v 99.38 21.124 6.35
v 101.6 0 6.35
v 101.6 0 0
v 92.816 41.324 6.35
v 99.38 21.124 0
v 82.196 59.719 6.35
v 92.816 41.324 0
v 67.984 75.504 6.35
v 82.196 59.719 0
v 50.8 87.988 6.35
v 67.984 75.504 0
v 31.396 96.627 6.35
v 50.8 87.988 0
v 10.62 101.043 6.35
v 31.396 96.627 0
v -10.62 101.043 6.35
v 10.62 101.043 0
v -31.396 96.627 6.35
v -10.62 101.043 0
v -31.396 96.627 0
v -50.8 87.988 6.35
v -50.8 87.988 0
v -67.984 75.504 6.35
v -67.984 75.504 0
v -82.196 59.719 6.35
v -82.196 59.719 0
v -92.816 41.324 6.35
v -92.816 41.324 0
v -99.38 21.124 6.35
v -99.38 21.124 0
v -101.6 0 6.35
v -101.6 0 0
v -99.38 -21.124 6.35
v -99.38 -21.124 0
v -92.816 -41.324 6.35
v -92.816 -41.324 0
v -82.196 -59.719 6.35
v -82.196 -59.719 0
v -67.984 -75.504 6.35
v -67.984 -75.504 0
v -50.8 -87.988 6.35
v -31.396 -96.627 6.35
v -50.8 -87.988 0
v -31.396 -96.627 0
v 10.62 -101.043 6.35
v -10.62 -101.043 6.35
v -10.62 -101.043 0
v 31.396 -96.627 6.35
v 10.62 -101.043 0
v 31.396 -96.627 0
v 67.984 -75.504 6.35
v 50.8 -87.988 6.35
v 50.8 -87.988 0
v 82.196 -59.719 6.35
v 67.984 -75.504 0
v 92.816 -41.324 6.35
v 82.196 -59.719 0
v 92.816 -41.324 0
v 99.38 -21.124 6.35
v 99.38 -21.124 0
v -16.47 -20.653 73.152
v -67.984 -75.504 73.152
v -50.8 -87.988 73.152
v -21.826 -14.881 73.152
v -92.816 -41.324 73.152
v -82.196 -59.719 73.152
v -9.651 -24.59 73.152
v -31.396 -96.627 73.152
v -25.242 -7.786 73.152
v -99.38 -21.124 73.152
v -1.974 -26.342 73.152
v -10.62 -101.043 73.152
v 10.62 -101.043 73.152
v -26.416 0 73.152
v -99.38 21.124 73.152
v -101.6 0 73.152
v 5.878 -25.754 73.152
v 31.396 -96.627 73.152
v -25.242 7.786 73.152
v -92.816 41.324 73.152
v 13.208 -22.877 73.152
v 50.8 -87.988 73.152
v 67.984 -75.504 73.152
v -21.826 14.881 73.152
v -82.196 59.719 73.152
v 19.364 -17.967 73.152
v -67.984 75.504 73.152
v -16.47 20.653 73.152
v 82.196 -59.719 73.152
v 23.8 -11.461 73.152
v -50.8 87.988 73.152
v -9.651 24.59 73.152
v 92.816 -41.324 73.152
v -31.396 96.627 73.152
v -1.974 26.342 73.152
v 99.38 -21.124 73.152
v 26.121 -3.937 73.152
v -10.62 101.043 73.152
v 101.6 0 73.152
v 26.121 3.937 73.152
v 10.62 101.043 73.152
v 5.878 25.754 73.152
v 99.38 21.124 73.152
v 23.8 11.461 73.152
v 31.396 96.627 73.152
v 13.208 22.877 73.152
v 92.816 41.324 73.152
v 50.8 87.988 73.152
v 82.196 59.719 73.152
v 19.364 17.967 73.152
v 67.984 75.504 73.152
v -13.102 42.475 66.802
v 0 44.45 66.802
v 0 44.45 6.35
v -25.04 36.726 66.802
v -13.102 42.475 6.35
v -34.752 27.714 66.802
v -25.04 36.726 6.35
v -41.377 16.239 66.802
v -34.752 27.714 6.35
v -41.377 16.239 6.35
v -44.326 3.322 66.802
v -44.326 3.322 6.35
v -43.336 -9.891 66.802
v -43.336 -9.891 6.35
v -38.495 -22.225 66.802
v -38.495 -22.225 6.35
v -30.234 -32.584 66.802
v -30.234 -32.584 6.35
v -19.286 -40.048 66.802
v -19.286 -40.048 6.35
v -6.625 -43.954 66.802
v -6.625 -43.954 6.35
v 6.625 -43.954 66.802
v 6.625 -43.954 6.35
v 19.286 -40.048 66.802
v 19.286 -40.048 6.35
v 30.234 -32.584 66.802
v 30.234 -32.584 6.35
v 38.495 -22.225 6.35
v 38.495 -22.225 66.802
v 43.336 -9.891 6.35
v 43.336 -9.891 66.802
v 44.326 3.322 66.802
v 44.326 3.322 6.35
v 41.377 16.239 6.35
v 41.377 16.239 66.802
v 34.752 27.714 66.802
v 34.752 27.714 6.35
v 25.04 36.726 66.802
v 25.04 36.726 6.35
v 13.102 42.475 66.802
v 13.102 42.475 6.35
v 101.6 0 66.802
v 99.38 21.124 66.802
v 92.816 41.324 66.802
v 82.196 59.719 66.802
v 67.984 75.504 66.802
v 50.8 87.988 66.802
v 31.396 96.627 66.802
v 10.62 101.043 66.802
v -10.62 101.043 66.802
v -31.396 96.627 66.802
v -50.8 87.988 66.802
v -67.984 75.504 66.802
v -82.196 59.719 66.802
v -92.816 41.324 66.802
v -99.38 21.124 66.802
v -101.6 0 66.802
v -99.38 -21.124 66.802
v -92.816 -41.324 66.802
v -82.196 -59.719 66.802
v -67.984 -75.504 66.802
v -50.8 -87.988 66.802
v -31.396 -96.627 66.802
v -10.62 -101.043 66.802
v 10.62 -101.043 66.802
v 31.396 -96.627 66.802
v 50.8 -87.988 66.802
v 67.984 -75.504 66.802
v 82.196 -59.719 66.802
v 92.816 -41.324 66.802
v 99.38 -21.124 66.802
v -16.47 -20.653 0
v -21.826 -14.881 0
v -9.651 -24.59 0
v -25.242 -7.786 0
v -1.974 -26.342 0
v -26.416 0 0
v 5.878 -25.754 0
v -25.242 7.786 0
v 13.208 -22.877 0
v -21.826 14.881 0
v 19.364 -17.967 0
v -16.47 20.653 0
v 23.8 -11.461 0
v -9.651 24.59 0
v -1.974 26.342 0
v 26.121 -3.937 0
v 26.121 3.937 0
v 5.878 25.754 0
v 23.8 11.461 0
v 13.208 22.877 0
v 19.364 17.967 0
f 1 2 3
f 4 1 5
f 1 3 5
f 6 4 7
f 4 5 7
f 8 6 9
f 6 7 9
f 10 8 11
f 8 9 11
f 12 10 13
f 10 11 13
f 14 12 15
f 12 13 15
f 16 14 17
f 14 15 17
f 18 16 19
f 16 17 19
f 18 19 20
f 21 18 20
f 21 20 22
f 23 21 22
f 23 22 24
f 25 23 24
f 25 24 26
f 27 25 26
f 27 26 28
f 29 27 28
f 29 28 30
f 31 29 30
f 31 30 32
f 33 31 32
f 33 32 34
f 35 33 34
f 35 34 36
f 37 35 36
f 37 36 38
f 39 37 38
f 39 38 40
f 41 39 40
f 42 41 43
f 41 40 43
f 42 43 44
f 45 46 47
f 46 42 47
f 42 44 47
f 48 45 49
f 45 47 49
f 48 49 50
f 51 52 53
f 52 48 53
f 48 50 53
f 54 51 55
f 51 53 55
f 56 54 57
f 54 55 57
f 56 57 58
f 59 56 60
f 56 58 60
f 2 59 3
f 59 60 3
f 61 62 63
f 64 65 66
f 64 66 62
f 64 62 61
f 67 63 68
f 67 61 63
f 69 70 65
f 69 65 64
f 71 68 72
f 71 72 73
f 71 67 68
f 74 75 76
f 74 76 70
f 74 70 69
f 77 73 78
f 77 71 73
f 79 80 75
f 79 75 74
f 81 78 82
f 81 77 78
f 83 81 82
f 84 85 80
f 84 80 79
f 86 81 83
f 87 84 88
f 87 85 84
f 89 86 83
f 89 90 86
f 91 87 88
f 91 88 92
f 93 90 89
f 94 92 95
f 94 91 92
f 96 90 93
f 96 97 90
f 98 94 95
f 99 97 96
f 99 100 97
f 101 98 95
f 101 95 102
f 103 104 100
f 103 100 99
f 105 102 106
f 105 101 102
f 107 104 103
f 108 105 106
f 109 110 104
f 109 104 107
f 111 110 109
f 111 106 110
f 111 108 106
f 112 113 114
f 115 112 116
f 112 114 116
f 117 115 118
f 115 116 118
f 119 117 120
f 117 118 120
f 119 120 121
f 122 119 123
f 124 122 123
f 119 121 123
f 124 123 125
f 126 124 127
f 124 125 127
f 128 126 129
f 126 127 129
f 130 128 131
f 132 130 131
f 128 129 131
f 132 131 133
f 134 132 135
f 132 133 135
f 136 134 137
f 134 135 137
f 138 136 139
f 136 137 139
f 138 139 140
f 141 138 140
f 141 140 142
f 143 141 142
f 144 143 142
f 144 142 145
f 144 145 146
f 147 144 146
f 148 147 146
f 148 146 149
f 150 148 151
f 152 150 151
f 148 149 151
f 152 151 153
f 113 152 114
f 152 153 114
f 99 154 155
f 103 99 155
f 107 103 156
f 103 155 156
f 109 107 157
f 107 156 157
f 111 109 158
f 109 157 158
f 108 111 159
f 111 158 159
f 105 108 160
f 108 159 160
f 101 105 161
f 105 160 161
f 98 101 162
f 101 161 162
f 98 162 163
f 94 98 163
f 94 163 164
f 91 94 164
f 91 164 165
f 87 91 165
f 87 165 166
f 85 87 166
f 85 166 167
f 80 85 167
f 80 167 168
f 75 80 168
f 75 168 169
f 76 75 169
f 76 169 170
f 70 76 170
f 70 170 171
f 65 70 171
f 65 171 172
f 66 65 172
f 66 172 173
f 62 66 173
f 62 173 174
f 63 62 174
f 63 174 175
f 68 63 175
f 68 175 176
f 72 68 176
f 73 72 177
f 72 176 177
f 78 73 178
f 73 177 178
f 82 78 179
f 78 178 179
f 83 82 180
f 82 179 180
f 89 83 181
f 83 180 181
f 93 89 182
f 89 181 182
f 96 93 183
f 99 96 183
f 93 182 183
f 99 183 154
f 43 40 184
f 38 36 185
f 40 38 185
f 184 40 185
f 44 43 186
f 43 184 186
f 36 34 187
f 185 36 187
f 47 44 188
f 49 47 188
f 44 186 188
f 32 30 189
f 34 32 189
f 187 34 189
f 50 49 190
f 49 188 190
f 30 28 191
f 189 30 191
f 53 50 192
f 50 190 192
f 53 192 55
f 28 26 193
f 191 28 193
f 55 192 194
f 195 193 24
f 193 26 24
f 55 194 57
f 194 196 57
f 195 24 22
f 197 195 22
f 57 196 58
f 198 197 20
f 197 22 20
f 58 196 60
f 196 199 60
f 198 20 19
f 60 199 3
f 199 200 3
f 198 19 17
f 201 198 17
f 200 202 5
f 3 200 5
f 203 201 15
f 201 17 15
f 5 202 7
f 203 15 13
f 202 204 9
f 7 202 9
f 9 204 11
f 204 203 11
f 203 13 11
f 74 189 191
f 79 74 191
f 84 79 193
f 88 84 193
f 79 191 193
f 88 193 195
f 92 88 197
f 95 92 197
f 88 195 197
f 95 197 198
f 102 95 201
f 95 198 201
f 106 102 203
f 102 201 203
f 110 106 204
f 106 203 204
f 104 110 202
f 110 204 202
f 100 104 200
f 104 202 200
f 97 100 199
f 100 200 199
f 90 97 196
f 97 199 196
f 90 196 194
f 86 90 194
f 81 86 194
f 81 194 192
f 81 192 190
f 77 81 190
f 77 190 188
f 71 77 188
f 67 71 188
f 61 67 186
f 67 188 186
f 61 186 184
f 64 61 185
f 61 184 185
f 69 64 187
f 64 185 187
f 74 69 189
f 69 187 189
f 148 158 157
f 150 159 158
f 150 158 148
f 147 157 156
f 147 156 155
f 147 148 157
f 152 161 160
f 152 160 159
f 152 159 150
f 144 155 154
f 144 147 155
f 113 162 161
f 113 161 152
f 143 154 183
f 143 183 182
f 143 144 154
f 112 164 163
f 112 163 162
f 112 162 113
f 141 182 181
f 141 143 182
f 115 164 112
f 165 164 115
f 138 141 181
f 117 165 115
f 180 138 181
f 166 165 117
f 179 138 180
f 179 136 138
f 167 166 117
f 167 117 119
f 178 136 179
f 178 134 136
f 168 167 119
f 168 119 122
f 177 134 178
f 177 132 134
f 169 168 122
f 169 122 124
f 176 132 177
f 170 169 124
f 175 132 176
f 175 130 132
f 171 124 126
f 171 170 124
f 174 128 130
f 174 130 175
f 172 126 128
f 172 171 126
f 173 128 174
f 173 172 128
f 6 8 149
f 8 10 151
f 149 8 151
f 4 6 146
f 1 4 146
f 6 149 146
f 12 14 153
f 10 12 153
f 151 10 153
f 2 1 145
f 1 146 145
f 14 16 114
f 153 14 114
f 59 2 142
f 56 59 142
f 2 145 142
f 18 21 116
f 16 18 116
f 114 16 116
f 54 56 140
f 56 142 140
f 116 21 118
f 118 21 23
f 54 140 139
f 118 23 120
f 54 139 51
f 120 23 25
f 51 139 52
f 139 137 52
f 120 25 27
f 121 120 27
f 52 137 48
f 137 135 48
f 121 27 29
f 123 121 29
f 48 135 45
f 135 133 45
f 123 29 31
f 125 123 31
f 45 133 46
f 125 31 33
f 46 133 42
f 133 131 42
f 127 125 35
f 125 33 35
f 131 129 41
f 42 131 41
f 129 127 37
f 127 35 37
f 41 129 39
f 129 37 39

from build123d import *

# Parameters (mm, degrees)
SKETCH1_R           = 101.6
BOSS_EXTRUDE1_DEPTH = 73.152
SKETCH3_W           = 60.452
SKETCH3_H           = 57.15
SKETCH4_R           = 26.416
CUT_EXTRUDE1_DEPTH  = 73.152


with BuildPart() as part:
    # Sketch1 → Boss-Extrude1 (new body)
    with BuildSketch(Plane.XY):
        Circle(SKETCH1_R)
    extrude(amount=BOSS_EXTRUDE1_DEPTH)

    # Sketch3 → Cut-Revolve2 (revolve, cut)
    with BuildSketch(Plane(origin=(0, 0, 0), x_dir=(0, 0, -1), z_dir=(1, 0, 0))):
        with Locations((-36.576, 73.025)):
            Rectangle(SKETCH3_W, SKETCH3_H)
    revolve(axis=Axis((0, 0, 0), (0, 0, 1)), mode=Mode.SUBTRACT)

    # Sketch4 → Cut-Extrude1 (cut)
    with BuildSketch(Plane(origin=(0, 0, 0), x_dir=(-1, 0, 0), z_dir=(0, 0, -1))):
        Circle(SKETCH4_R)
    extrude(amount=-CUT_EXTRUDE1_DEPTH, mode=Mode.SUBTRACT)


solid = part.part
